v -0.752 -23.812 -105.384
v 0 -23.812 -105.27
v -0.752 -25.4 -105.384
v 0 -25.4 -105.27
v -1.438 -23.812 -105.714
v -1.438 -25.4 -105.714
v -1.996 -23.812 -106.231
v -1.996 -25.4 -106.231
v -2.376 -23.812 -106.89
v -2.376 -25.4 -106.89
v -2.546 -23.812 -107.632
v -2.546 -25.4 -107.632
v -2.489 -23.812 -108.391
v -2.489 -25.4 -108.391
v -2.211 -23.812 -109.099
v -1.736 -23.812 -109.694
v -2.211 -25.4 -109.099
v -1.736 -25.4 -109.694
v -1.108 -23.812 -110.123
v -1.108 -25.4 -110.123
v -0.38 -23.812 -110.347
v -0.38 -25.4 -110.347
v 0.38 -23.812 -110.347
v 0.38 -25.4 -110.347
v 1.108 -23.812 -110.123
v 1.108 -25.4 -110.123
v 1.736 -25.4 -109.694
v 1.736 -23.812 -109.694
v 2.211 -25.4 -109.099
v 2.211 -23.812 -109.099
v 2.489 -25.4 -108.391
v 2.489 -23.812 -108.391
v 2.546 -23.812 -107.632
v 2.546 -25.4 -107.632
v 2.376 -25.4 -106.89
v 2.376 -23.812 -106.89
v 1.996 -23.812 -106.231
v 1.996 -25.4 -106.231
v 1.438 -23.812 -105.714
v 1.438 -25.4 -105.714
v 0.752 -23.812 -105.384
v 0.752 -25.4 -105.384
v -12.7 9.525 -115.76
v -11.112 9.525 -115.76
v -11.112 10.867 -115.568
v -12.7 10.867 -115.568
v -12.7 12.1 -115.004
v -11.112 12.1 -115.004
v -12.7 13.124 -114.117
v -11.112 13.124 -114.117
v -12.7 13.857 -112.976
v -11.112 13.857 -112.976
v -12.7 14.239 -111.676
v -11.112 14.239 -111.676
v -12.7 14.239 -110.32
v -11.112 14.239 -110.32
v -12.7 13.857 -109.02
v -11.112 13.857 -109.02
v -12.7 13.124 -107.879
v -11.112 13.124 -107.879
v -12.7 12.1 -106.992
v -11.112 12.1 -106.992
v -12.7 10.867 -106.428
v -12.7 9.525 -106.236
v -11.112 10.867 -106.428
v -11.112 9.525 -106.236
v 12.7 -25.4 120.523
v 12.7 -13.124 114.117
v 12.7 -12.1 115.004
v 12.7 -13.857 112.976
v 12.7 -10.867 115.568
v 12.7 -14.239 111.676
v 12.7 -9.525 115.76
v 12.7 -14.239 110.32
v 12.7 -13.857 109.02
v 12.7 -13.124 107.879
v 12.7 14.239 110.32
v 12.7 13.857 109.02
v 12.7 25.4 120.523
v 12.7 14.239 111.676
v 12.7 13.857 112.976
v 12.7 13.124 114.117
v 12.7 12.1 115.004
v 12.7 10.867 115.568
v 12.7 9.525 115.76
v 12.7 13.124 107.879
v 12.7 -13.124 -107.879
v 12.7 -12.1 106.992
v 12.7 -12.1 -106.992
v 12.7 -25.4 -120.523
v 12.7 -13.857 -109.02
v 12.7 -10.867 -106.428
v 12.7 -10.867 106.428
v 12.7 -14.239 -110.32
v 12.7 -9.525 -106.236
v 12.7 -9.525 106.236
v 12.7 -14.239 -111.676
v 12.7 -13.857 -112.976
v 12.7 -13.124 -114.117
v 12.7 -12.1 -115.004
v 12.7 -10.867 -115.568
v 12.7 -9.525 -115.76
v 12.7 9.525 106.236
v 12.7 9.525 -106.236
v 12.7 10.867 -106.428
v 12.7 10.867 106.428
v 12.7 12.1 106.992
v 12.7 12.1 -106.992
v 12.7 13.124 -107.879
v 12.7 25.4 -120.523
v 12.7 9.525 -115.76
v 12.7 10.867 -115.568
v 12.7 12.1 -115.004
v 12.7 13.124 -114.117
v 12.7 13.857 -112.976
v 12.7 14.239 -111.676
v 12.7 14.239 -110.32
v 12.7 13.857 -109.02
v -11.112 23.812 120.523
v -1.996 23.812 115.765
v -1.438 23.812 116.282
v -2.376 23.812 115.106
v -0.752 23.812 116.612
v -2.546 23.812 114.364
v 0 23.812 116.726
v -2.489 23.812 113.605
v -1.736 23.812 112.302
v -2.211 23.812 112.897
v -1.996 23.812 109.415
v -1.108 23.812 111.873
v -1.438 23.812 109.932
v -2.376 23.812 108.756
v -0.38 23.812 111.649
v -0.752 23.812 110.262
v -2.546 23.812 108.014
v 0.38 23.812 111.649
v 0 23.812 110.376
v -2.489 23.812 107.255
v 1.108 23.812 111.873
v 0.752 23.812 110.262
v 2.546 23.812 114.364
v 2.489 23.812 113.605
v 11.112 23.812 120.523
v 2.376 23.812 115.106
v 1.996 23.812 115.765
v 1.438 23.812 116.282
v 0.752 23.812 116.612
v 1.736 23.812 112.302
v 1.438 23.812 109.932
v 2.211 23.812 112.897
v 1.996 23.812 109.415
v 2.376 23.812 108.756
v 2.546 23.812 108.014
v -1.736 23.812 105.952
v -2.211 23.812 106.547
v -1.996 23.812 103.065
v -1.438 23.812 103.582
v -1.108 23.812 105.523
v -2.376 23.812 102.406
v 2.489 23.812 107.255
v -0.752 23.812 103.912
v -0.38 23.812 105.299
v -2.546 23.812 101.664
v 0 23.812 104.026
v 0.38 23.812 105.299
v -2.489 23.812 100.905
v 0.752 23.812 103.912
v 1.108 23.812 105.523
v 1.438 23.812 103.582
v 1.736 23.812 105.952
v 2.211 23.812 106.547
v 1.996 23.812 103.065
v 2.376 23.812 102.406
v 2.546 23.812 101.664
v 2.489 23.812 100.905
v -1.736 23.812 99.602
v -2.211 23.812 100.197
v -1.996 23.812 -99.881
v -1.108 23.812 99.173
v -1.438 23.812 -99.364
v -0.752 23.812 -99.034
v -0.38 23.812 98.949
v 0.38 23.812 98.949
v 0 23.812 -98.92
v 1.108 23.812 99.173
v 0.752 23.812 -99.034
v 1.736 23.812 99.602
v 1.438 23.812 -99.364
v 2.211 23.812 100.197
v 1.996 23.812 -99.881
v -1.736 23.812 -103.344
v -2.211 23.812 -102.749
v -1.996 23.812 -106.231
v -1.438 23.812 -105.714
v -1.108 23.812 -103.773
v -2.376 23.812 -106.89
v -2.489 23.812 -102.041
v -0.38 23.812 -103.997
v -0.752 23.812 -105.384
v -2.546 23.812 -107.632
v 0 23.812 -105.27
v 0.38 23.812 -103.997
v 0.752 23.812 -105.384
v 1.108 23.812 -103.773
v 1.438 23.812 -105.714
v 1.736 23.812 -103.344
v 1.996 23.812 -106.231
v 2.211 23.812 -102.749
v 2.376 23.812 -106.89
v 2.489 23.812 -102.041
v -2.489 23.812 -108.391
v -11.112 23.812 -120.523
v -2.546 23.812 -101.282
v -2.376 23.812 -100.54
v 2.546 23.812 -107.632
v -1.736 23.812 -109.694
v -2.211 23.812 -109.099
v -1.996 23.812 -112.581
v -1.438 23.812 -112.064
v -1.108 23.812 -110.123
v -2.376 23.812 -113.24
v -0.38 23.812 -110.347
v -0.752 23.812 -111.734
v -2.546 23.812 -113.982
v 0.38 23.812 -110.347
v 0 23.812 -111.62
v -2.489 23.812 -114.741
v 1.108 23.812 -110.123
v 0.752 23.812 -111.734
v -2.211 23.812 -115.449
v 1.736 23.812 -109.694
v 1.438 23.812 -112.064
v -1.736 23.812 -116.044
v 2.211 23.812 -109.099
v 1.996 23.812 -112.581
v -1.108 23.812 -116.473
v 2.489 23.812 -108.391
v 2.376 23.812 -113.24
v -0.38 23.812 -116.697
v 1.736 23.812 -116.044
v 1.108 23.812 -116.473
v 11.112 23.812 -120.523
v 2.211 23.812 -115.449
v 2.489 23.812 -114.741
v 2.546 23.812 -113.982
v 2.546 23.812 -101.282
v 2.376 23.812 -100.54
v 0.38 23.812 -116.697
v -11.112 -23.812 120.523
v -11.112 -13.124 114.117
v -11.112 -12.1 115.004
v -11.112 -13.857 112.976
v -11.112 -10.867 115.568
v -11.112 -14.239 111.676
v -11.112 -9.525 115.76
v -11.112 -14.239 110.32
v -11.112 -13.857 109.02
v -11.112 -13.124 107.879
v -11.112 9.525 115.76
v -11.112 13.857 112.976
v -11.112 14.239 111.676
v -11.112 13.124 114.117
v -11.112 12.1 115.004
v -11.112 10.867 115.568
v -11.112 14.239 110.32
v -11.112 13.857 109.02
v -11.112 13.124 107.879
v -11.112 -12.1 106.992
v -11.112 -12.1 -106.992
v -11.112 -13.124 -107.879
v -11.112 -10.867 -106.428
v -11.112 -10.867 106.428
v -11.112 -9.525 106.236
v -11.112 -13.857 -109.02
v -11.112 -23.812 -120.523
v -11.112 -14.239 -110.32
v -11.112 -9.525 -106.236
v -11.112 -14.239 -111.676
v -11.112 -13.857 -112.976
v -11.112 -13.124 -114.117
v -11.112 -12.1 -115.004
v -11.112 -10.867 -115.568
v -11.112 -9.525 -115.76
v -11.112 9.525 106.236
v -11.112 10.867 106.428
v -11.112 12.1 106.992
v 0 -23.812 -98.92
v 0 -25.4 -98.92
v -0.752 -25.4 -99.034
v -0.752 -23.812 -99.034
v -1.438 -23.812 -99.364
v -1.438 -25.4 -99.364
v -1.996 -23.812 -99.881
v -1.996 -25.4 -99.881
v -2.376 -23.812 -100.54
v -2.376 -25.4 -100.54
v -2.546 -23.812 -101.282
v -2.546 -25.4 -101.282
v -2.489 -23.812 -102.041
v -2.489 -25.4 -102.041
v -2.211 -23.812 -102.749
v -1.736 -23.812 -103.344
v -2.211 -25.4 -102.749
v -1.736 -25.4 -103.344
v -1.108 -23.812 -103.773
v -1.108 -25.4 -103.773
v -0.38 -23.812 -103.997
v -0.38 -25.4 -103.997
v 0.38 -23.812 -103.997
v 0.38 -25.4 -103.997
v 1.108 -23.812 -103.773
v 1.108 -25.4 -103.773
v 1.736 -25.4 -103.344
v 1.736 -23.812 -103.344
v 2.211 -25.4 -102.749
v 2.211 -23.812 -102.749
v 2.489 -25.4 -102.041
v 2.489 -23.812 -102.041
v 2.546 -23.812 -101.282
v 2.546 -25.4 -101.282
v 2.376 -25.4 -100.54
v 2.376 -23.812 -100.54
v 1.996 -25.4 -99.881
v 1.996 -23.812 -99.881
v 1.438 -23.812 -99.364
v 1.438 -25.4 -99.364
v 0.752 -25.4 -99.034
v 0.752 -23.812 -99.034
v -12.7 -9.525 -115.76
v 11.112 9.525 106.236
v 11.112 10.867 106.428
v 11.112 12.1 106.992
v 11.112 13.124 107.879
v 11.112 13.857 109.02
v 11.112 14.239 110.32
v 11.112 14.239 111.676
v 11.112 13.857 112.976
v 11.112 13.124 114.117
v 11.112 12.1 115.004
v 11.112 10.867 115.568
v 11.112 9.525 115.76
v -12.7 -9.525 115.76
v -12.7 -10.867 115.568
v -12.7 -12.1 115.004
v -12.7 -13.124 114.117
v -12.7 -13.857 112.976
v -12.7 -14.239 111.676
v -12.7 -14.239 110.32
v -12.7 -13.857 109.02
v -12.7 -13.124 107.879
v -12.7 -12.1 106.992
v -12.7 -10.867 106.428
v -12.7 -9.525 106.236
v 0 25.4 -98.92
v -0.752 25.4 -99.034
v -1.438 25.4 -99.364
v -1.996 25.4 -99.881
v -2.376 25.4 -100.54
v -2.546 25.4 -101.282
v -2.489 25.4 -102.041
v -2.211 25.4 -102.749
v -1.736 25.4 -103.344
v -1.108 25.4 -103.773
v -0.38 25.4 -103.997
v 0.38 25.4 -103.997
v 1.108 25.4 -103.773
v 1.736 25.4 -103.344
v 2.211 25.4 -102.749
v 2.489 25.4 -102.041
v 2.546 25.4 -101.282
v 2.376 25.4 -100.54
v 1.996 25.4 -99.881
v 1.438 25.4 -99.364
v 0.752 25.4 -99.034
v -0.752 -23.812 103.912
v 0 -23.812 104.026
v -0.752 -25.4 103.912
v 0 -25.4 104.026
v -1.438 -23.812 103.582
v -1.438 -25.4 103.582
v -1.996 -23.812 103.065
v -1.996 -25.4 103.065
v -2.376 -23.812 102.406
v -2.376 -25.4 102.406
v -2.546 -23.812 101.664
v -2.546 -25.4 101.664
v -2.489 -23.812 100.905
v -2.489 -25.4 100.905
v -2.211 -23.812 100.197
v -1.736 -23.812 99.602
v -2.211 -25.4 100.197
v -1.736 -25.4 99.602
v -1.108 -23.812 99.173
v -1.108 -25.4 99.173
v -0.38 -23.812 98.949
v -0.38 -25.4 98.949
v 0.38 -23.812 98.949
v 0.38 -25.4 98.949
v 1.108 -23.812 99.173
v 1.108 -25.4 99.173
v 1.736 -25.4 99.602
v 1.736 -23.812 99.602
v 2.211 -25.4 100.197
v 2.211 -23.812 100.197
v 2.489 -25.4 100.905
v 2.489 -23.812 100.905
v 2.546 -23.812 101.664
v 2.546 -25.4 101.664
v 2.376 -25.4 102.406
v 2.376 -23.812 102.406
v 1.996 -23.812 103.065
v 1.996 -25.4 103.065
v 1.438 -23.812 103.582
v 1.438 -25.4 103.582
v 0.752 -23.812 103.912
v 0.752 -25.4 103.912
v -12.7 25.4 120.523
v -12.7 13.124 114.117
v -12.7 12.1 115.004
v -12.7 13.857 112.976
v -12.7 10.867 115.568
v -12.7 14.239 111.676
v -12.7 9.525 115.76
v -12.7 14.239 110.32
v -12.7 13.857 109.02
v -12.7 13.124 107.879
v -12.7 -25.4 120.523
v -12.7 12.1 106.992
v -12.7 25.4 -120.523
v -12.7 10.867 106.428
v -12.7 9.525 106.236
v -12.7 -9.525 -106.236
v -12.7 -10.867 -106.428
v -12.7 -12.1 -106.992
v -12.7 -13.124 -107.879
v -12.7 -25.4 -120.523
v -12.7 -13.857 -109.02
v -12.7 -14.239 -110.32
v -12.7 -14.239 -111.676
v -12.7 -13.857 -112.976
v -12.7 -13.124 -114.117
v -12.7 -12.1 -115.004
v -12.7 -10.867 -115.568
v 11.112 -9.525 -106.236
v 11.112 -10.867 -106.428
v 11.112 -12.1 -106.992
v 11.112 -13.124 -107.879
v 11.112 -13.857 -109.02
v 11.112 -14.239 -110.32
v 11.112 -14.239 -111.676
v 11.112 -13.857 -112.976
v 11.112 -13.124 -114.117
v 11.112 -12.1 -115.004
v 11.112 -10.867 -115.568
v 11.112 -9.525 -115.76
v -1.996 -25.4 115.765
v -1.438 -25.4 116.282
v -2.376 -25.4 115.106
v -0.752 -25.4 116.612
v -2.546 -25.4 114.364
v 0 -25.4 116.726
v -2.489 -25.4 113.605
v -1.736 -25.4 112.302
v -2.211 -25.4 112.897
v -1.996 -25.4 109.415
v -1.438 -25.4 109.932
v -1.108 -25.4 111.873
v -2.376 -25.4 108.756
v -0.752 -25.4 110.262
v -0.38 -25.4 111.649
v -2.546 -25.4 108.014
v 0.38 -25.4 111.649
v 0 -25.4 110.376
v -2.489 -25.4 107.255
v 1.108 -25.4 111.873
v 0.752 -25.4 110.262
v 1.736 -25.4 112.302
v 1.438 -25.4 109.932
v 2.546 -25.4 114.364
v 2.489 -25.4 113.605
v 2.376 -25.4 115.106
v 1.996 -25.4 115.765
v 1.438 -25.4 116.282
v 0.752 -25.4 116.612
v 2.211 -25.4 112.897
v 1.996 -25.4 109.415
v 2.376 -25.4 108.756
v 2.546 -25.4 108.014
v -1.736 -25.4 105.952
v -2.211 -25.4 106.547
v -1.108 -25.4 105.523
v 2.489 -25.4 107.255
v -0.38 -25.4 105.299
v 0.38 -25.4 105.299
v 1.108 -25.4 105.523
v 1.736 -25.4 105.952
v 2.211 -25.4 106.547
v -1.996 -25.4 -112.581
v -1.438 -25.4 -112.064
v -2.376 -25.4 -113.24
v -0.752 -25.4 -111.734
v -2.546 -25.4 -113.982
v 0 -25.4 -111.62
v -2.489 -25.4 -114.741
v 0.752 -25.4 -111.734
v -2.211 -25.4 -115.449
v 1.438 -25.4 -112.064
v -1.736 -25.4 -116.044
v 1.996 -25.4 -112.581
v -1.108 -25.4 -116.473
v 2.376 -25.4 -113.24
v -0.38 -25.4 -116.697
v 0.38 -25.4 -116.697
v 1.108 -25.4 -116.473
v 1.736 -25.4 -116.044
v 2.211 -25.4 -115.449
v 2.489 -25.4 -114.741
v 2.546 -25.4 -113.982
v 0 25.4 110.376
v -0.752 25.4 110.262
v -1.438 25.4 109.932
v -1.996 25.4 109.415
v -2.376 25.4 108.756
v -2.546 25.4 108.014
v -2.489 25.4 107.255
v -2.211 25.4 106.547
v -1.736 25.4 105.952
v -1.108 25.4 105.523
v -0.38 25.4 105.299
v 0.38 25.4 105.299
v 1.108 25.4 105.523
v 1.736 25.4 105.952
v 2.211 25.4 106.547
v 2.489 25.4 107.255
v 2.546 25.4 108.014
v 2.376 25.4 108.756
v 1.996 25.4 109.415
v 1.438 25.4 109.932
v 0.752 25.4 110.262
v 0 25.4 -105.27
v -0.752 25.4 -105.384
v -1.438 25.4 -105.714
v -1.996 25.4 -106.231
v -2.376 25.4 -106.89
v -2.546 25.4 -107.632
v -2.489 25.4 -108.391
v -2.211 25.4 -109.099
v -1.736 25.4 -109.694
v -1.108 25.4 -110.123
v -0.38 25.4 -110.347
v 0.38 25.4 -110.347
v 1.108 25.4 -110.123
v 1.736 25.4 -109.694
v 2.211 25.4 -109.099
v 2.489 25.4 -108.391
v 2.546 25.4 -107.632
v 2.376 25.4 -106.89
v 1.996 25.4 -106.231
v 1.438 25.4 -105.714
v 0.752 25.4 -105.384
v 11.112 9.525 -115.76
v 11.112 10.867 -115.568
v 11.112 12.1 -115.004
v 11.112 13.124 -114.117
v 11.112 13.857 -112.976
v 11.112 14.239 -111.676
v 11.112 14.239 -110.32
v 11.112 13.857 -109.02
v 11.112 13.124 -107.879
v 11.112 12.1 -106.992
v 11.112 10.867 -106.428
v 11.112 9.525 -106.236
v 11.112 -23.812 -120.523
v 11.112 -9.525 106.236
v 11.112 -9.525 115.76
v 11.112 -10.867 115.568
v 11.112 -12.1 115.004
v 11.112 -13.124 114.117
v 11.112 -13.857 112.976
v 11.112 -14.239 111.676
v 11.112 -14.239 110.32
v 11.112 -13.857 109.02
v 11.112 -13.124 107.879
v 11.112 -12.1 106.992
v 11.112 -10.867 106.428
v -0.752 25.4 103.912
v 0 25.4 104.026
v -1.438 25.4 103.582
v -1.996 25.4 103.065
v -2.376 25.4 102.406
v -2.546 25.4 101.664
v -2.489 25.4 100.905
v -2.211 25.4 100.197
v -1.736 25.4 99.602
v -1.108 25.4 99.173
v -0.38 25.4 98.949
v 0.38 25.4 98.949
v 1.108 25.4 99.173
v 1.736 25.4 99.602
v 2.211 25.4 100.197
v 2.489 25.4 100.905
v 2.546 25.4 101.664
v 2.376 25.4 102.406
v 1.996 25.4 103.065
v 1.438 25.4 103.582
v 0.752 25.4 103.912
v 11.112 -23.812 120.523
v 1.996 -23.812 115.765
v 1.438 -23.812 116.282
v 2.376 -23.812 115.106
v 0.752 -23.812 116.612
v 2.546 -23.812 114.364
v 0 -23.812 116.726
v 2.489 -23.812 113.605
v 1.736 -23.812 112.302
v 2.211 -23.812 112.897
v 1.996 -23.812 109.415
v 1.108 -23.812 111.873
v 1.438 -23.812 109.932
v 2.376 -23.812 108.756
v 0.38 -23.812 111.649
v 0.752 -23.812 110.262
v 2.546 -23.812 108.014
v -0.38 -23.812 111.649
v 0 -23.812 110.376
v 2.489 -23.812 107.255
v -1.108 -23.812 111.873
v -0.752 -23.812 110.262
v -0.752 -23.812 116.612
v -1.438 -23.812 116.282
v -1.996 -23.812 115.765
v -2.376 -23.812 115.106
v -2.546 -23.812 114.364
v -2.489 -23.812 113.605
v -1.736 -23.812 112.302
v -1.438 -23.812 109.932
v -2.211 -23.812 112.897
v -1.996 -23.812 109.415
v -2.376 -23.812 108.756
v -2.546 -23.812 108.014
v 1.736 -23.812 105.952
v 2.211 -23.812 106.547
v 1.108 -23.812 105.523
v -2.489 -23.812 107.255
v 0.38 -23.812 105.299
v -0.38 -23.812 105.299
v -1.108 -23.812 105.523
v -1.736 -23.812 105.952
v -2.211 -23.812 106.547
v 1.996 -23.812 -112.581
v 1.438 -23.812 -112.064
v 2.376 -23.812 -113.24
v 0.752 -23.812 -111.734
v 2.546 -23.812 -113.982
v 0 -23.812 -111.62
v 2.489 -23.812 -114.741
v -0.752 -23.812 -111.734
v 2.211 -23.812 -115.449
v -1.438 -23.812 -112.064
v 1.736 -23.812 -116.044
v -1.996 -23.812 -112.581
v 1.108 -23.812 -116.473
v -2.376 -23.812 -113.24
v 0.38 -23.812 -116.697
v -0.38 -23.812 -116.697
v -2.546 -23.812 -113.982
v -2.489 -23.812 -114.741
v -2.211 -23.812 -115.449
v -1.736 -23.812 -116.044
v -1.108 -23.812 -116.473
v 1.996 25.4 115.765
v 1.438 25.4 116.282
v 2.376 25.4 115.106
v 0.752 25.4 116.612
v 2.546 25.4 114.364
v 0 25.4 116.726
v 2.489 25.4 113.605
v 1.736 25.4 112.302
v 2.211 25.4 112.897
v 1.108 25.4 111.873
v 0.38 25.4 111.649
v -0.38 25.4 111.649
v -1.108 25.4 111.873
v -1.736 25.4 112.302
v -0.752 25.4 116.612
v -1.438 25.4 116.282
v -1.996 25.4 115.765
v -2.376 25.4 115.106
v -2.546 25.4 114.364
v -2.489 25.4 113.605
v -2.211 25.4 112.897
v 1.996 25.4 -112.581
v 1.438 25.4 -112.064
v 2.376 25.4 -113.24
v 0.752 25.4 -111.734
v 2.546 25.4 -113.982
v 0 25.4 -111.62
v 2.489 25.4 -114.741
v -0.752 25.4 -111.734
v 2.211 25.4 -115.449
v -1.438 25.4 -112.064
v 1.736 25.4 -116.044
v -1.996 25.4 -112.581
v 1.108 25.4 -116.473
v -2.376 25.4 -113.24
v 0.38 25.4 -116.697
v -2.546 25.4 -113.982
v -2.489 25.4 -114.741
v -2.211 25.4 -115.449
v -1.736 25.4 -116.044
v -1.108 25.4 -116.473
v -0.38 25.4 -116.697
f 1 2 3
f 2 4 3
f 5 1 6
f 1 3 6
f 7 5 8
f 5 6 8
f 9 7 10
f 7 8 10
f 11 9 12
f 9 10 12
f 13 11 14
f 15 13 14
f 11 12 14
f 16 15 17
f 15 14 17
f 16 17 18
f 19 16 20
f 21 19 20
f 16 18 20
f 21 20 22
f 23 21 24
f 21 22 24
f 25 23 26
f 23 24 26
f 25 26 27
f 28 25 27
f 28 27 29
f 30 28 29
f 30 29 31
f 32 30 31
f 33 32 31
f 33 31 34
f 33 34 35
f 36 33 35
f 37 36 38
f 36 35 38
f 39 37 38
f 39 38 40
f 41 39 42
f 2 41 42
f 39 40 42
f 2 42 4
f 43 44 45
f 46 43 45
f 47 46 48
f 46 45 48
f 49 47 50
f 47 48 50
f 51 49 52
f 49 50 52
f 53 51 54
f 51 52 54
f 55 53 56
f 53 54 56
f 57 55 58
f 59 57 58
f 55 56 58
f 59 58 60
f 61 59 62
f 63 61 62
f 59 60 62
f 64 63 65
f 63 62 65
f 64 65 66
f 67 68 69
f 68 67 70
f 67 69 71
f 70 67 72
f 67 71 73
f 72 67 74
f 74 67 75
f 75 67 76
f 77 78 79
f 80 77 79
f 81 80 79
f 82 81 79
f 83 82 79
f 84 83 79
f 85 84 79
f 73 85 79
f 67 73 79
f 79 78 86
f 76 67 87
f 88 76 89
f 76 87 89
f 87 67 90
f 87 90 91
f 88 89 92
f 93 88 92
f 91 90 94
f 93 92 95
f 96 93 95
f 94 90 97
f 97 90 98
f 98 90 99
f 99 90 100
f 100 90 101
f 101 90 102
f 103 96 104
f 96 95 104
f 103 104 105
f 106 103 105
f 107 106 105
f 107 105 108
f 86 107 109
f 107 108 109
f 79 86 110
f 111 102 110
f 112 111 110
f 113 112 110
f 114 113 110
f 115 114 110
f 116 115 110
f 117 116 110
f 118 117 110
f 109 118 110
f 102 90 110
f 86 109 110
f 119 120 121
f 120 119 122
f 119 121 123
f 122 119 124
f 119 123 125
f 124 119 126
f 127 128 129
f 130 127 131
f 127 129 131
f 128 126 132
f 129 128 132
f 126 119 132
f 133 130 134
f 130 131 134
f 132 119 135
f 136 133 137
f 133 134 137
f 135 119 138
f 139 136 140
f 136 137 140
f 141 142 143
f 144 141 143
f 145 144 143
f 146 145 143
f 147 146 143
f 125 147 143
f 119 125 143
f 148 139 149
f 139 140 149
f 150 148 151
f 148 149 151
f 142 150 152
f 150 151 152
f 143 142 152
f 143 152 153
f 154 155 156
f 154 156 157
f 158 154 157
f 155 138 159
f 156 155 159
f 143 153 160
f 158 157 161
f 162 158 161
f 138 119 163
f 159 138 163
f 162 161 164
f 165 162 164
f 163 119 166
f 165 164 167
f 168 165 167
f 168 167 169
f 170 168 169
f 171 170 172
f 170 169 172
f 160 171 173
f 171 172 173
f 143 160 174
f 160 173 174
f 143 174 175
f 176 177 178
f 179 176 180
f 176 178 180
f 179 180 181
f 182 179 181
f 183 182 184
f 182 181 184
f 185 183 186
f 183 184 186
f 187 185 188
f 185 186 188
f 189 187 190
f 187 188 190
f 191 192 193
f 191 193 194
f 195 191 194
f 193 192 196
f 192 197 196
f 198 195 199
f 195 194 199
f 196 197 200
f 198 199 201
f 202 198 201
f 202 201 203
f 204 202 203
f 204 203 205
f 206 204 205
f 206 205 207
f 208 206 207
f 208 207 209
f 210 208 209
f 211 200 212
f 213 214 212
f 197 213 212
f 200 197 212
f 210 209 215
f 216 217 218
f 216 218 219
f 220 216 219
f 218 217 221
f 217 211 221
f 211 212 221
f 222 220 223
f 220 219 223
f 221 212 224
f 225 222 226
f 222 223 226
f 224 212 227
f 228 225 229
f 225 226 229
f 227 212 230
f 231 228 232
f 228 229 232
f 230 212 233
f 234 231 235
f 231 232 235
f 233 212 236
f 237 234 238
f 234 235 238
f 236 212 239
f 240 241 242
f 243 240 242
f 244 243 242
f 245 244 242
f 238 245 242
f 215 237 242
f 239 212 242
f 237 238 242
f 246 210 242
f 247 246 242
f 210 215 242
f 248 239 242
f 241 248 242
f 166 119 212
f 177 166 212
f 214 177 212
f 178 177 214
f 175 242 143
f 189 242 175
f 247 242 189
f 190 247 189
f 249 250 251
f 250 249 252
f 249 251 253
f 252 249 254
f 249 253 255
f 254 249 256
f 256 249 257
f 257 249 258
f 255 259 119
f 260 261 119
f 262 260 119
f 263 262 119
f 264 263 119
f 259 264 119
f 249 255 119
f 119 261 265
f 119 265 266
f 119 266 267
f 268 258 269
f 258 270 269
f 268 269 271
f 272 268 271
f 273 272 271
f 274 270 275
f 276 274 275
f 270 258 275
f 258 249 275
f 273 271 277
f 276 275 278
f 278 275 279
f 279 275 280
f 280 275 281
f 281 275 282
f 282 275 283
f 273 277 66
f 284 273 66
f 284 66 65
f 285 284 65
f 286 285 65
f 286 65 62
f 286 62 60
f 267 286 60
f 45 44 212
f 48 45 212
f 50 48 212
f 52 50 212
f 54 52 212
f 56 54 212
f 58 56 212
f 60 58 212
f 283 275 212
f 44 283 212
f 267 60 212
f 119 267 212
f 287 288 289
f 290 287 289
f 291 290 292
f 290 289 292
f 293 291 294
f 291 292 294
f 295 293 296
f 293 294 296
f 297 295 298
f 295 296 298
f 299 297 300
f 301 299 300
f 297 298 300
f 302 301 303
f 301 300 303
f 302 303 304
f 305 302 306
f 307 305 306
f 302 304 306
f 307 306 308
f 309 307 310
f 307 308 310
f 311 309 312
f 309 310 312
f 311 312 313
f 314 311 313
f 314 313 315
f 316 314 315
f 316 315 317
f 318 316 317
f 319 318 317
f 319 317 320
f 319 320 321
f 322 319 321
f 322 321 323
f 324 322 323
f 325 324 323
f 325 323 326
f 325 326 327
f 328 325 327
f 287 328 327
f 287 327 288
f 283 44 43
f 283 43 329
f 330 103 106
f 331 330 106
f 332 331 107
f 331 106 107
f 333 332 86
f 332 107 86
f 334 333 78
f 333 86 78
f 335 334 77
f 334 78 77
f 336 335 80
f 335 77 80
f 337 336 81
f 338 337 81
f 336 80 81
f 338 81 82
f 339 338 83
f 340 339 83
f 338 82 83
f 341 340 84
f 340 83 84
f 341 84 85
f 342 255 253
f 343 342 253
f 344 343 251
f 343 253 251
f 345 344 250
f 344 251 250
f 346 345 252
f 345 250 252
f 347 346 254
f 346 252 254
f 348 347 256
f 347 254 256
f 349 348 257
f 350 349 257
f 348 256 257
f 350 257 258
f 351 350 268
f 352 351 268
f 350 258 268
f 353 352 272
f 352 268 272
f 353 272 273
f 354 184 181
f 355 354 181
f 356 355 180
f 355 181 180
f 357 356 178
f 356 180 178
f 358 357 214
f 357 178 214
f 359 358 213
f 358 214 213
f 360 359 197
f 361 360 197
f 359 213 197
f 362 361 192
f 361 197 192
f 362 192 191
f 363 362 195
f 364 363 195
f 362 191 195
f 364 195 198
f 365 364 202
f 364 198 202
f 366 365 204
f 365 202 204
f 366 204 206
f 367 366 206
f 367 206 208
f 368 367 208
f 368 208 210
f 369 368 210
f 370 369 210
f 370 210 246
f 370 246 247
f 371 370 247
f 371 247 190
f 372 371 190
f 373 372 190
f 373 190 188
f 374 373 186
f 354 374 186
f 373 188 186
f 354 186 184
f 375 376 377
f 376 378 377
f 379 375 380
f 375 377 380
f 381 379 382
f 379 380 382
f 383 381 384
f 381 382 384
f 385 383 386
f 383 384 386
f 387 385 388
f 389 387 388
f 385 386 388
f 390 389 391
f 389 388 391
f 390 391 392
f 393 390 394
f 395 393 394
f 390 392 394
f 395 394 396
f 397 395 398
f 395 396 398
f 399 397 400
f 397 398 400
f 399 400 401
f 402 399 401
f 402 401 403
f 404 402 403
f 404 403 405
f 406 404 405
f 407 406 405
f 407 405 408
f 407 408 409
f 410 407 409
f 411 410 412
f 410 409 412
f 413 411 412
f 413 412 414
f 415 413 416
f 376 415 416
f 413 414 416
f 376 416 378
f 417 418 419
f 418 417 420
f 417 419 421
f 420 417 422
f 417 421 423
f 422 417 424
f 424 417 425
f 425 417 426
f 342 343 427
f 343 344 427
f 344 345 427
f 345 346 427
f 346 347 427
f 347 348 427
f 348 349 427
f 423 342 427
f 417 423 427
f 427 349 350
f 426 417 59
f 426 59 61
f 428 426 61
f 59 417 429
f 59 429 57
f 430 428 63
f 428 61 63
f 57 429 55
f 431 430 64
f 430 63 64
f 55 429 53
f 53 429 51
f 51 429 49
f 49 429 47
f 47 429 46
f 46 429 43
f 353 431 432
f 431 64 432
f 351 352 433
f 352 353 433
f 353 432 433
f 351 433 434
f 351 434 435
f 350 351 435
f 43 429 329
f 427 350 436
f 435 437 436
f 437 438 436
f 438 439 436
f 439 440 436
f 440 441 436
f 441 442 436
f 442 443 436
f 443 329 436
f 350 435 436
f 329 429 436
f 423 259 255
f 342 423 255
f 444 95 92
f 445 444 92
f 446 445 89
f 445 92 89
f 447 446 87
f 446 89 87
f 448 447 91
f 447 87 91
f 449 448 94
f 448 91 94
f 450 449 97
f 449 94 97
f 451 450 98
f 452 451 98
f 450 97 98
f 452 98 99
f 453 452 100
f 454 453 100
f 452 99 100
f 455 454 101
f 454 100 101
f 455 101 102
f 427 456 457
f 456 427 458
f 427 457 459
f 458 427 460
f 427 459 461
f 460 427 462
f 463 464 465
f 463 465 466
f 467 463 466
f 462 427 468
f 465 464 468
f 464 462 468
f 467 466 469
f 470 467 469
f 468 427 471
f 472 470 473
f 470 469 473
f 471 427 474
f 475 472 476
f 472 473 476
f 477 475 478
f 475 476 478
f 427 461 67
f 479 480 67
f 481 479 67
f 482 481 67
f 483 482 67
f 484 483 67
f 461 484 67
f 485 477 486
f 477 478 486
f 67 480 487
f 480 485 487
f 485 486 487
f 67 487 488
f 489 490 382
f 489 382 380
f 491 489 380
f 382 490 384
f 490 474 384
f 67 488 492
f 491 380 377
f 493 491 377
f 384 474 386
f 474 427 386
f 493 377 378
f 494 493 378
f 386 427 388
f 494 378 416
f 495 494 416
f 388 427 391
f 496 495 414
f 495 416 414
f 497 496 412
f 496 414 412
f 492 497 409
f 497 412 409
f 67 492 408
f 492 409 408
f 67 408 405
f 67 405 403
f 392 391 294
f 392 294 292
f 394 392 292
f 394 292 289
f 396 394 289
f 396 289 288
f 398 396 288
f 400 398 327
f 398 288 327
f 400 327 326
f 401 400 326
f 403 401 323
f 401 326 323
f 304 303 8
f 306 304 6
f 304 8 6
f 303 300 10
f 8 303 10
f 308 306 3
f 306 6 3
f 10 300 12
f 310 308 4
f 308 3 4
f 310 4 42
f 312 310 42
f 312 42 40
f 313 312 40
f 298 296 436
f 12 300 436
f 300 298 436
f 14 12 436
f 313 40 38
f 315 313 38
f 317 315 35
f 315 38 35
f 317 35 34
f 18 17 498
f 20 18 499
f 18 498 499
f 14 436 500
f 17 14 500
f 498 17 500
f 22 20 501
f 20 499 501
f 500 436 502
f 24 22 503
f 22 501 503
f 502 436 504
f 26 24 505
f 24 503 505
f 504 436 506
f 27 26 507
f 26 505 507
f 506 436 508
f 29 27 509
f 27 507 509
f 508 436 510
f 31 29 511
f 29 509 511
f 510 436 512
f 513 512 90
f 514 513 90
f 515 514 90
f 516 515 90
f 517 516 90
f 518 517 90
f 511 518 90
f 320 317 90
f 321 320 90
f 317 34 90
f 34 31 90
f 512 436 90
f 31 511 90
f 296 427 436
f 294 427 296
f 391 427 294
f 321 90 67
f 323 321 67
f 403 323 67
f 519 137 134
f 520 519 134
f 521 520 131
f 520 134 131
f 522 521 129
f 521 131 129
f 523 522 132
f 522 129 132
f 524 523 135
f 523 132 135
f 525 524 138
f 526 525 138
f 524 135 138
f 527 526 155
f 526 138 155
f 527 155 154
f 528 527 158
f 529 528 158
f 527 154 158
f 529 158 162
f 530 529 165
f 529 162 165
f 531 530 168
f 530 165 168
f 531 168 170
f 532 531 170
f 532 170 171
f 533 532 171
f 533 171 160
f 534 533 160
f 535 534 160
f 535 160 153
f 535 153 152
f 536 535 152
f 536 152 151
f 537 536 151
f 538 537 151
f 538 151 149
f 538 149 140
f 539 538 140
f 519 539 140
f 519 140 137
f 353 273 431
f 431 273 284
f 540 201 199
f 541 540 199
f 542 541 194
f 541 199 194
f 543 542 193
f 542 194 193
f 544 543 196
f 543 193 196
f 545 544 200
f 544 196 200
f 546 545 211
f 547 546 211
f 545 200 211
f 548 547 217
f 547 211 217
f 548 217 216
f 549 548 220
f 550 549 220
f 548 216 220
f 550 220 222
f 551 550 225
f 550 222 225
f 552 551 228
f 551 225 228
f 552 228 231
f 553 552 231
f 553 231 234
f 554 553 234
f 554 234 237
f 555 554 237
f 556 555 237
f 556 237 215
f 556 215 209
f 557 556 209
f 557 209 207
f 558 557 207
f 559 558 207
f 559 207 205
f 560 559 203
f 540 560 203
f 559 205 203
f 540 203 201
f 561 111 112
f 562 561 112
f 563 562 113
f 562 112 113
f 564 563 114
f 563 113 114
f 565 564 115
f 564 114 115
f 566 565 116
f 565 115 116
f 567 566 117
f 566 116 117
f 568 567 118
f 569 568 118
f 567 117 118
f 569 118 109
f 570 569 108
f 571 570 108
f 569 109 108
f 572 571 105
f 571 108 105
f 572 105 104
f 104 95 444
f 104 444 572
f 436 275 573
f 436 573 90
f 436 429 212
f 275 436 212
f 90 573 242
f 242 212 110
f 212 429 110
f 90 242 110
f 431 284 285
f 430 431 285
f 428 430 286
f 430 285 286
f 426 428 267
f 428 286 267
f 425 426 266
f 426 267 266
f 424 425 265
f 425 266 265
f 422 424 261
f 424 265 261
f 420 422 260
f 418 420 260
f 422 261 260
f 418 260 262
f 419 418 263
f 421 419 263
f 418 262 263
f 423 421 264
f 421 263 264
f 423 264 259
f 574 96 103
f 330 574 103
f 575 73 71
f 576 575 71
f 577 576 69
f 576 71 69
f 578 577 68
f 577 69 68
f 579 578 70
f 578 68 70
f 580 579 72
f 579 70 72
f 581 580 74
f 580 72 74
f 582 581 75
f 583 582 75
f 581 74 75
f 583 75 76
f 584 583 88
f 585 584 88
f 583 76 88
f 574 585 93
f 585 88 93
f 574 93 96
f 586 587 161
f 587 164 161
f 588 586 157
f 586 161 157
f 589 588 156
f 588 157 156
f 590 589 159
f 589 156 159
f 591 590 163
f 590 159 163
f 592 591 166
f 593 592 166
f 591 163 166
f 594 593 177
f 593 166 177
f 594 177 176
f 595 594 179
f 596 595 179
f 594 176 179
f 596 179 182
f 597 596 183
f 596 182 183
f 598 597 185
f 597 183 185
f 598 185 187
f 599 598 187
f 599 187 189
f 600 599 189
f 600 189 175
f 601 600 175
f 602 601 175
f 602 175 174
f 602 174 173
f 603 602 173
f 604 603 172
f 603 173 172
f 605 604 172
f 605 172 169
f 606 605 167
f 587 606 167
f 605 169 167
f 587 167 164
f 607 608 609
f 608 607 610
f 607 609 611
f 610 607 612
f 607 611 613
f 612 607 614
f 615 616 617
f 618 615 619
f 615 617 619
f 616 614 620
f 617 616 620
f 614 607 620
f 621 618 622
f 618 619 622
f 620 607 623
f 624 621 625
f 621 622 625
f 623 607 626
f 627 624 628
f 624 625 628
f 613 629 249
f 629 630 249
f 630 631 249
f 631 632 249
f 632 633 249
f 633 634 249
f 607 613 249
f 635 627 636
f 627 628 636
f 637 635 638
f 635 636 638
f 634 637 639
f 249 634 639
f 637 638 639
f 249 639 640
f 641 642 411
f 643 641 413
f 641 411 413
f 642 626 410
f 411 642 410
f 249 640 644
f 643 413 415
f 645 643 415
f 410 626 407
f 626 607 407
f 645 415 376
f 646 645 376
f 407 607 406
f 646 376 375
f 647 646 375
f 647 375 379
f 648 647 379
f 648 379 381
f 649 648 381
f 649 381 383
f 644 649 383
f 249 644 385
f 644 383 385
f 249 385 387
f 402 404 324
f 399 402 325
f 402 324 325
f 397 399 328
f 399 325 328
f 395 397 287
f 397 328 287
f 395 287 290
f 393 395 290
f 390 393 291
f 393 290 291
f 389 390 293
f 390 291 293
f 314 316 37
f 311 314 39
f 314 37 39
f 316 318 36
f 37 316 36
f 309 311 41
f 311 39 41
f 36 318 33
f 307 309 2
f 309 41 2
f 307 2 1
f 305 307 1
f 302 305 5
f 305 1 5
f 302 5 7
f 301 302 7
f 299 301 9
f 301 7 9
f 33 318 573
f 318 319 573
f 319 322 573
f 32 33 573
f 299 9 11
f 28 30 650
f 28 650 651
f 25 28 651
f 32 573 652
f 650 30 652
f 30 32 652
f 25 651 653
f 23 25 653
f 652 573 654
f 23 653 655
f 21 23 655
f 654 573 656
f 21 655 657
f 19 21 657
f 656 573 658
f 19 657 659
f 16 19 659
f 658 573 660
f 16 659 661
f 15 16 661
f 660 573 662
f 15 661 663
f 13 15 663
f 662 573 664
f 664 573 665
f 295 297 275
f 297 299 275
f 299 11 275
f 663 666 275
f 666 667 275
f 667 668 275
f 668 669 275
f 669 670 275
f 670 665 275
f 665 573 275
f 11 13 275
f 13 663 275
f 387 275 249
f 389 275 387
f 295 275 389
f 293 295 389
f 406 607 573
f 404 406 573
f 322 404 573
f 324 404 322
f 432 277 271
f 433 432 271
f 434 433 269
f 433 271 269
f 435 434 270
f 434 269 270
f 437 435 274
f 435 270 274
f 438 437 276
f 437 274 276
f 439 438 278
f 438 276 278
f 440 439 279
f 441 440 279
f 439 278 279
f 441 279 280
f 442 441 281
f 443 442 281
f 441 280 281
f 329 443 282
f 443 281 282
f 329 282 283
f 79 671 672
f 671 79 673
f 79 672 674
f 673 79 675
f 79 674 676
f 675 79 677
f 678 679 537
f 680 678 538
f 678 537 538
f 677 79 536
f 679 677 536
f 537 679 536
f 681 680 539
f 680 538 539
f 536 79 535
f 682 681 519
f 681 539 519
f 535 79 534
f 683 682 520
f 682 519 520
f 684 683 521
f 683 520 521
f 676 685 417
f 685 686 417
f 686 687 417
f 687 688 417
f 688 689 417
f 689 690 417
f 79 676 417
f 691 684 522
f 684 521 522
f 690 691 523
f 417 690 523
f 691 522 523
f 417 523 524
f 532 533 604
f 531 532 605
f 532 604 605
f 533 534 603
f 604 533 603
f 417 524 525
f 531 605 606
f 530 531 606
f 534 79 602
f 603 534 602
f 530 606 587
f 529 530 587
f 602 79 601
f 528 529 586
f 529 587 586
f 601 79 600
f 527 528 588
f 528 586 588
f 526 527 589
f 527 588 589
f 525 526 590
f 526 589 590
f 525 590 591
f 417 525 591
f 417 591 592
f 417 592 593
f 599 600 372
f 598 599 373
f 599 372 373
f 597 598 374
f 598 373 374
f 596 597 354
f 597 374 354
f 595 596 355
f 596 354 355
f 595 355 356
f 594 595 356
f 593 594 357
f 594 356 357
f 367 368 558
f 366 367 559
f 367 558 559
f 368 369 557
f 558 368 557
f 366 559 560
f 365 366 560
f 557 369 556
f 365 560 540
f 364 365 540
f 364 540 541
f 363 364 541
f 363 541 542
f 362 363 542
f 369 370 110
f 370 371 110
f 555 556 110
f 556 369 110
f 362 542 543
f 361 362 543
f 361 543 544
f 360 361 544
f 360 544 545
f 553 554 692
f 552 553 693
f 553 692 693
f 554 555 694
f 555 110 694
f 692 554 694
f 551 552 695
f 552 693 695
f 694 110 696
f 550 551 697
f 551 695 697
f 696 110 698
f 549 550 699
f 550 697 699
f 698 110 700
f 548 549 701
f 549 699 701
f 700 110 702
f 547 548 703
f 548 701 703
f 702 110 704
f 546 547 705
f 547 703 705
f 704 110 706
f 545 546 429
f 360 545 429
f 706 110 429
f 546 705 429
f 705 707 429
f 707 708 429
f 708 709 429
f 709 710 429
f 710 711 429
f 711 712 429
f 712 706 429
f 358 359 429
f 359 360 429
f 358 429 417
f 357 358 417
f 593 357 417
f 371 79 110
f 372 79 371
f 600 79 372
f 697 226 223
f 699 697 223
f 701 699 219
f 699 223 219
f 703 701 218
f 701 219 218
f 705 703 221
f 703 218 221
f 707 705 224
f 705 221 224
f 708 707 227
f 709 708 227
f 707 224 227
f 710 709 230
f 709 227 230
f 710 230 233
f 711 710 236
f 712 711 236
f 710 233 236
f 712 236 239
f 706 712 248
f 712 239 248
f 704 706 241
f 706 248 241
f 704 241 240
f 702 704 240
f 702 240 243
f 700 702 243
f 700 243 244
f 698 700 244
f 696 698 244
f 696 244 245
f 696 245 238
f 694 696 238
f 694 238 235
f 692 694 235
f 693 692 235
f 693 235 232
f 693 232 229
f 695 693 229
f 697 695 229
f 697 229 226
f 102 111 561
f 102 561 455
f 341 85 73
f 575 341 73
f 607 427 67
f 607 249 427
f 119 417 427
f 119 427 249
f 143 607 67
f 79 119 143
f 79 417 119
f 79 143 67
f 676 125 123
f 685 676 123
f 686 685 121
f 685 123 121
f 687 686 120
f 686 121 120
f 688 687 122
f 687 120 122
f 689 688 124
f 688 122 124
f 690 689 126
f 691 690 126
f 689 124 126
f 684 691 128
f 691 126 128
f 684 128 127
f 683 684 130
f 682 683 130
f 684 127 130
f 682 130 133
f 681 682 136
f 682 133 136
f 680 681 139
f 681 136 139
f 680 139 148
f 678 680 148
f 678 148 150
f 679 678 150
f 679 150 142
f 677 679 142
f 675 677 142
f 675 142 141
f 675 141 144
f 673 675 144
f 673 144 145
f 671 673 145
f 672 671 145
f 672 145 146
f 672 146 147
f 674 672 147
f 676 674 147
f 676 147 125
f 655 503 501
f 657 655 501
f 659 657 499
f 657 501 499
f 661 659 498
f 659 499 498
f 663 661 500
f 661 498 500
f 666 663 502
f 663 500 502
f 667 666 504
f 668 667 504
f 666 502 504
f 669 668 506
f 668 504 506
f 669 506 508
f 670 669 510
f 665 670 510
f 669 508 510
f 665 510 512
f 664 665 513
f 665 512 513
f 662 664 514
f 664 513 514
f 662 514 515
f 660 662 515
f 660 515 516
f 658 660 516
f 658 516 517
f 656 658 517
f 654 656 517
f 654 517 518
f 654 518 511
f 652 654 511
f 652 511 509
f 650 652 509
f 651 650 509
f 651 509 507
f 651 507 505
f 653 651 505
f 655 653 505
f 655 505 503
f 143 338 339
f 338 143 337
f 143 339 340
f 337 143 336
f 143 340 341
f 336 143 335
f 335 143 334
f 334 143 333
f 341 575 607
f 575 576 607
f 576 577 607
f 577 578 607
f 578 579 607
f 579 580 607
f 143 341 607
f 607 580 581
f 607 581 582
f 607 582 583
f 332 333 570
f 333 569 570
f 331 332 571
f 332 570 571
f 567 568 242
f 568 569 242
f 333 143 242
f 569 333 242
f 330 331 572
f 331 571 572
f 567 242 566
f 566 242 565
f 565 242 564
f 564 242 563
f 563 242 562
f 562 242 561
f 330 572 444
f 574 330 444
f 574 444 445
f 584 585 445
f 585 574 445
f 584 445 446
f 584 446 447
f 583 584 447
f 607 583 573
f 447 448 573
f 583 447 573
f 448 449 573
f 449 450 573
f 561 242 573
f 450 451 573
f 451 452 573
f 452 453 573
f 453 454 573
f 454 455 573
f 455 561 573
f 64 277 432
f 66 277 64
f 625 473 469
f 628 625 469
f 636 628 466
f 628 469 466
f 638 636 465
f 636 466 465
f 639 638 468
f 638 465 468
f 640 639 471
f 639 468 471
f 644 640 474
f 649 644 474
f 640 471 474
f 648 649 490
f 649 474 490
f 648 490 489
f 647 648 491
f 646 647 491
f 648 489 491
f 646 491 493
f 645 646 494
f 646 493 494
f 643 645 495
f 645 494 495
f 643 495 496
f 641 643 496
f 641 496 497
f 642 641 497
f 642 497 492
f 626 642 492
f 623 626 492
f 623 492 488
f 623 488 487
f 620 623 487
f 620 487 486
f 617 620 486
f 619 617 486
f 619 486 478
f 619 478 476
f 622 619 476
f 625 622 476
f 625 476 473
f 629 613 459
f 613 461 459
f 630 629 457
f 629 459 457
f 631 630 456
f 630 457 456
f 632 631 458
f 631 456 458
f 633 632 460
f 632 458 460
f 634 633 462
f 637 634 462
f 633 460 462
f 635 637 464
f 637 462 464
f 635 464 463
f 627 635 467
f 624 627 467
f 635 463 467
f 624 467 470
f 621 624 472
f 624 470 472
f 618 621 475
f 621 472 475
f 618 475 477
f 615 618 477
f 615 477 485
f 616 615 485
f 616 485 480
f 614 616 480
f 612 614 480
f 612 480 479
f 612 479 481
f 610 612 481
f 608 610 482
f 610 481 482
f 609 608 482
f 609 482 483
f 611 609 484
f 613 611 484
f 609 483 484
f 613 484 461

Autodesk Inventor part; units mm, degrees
ref_plane "YZ Plane" through (0, 0, 0) normal (1, 0, 0) x (0, 1, 0)
ref_plane "XZ Plane" through (0, 0, 0) normal (0, 1, 0) x (-1, 0, 0)
ref_plane "XY Plane" through (0, 0, 0) normal (0, 0, 1) x (1, 0, 0)
sketch "Sketch1" plane through (0, 0, 0) normal (0, 0, 1) x (1, 0, 0)
  line L0 (-12.7, -25.4) -> (12.7, -25.4)
  line L1 (12.7, -25.4) -> (12.7, 25.4)
  line L2 (12.7, 25.4) -> (-12.7, 25.4)
  line L3 (-12.7, 25.4) -> (-12.7, -25.4)
  line L4 (-12.7, -25.4) -> (12.7, 25.4) construction
  line L5 (12.7, -25.4) -> (-12.7, 25.4) construction
  line L6 (-11.1125, 23.8125) -> (11.1125, 23.8125)
  line L7 (11.1125, 23.8125) -> (11.1125, -23.8125)
  line L8 (11.1125, -23.8125) -> (-11.1125, -23.8125)
  line L9 (-11.1125, -23.8125) -> (-11.1125, 23.8125)
  point P0 (0, 0)
  dimension "width" = 25.4
  dimension "height" = 50.8
  dimension "thickness" = 1.5875
extrude "Extrusion1" add sketch "Sketch1" along normal mid plane 241.046
sketch "Sketch3" plane through (-12.7, 25.4, 120.523) normal (0, 1, 0) x (1, 0, 0)
  line L0 (25.4, 0) -> (0, 0) projected
  line L1 (0, 241.046) -> (0, 0) construction
  line L2 (0, 241.046) -> (25.4, 241.046) construction
  point P0 (12.7, 120.523)
  point P1 (12.7, 6.35)
  point P2 (12.7, 12.7)
  point P3 (12.7, 19.05)
  point P4 (12.7, 234.696)
  point P5 (12.7, 228.346)
  point P6 (12.7, 221.996)
  dimension "d18" = 6.35
  dimension "d19" = 6.35
  dimension "d20" = 6.35
  dimension "d21" = 12.7
  dimension "d22" = 6.35
  dimension "d23" = 6.35
  dimension "d24" = 6.35
hole "Hole2" at (0, 25.4, 114.173) at (0, 25.4, 107.823) at (0, 25.4, 101.473) at (0, 25.4, -101.473) at (0, 25.4, -107.823) at (0, 25.4, -114.173) direction (0, -1, 0) diameter 5.1054 end through all clearance for "Flat Head Machine Screw (82)" size "#10" standard "Ansi Unified Screw Threads"
sketch "Sketch4" plane through (12.7, -25.4, 120.523) normal (1, 0, 0) x (0, 0, -1)
  line L0 (9.525, 34.925) -> (9.525, 15.875) construction
  line L1 (4.7625, 34.925) -> (4.7625, 15.875)
  line L2 (14.2875, 15.875) -> (14.2875, 34.925)
  arc A0 (14.2875, 34.925) -> (4.7625, 34.925) centre (9.525, 34.925) ccw
  arc A1 (4.7625, 15.875) -> (14.2875, 15.875) centre (9.525, 15.875) ccw
  line L3 (0, 0) -> (0, 50.8) construction
  line L4 (120.523, 25.4) -> (120.523, 50.8) construction
  line L5 (241.046, 50.8) -> (0, 50.8) construction
  line L6 (231.521, 34.925) -> (231.521, 15.875) construction
  line L7 (236.2835, 34.925) -> (236.2835, 15.875)
  line L8 (226.7585, 15.875) -> (226.7585, 34.925)
  arc A2 (236.2835, 34.925) -> (226.7585, 34.925) centre (231.521, 34.925) ccw
  arc A3 (226.7585, 15.875) -> (236.2835, 15.875) centre (231.521, 15.875) ccw
  point P0 (9.525, 25.4)
  point P1 (231.521, 25.4)
  dimension "d32" = 9.525
  dimension "d33" = 19.05
  dimension "d34" = 9.525
extrude "Extrusion2" cut sketch "Sketch4" against normal through all
equation "\"d20\" = d19"
equation "\"d23\" = d22"
equation "\"d24\" = d23"
properties part number "EL2-011" material "Aluminum 6061"
